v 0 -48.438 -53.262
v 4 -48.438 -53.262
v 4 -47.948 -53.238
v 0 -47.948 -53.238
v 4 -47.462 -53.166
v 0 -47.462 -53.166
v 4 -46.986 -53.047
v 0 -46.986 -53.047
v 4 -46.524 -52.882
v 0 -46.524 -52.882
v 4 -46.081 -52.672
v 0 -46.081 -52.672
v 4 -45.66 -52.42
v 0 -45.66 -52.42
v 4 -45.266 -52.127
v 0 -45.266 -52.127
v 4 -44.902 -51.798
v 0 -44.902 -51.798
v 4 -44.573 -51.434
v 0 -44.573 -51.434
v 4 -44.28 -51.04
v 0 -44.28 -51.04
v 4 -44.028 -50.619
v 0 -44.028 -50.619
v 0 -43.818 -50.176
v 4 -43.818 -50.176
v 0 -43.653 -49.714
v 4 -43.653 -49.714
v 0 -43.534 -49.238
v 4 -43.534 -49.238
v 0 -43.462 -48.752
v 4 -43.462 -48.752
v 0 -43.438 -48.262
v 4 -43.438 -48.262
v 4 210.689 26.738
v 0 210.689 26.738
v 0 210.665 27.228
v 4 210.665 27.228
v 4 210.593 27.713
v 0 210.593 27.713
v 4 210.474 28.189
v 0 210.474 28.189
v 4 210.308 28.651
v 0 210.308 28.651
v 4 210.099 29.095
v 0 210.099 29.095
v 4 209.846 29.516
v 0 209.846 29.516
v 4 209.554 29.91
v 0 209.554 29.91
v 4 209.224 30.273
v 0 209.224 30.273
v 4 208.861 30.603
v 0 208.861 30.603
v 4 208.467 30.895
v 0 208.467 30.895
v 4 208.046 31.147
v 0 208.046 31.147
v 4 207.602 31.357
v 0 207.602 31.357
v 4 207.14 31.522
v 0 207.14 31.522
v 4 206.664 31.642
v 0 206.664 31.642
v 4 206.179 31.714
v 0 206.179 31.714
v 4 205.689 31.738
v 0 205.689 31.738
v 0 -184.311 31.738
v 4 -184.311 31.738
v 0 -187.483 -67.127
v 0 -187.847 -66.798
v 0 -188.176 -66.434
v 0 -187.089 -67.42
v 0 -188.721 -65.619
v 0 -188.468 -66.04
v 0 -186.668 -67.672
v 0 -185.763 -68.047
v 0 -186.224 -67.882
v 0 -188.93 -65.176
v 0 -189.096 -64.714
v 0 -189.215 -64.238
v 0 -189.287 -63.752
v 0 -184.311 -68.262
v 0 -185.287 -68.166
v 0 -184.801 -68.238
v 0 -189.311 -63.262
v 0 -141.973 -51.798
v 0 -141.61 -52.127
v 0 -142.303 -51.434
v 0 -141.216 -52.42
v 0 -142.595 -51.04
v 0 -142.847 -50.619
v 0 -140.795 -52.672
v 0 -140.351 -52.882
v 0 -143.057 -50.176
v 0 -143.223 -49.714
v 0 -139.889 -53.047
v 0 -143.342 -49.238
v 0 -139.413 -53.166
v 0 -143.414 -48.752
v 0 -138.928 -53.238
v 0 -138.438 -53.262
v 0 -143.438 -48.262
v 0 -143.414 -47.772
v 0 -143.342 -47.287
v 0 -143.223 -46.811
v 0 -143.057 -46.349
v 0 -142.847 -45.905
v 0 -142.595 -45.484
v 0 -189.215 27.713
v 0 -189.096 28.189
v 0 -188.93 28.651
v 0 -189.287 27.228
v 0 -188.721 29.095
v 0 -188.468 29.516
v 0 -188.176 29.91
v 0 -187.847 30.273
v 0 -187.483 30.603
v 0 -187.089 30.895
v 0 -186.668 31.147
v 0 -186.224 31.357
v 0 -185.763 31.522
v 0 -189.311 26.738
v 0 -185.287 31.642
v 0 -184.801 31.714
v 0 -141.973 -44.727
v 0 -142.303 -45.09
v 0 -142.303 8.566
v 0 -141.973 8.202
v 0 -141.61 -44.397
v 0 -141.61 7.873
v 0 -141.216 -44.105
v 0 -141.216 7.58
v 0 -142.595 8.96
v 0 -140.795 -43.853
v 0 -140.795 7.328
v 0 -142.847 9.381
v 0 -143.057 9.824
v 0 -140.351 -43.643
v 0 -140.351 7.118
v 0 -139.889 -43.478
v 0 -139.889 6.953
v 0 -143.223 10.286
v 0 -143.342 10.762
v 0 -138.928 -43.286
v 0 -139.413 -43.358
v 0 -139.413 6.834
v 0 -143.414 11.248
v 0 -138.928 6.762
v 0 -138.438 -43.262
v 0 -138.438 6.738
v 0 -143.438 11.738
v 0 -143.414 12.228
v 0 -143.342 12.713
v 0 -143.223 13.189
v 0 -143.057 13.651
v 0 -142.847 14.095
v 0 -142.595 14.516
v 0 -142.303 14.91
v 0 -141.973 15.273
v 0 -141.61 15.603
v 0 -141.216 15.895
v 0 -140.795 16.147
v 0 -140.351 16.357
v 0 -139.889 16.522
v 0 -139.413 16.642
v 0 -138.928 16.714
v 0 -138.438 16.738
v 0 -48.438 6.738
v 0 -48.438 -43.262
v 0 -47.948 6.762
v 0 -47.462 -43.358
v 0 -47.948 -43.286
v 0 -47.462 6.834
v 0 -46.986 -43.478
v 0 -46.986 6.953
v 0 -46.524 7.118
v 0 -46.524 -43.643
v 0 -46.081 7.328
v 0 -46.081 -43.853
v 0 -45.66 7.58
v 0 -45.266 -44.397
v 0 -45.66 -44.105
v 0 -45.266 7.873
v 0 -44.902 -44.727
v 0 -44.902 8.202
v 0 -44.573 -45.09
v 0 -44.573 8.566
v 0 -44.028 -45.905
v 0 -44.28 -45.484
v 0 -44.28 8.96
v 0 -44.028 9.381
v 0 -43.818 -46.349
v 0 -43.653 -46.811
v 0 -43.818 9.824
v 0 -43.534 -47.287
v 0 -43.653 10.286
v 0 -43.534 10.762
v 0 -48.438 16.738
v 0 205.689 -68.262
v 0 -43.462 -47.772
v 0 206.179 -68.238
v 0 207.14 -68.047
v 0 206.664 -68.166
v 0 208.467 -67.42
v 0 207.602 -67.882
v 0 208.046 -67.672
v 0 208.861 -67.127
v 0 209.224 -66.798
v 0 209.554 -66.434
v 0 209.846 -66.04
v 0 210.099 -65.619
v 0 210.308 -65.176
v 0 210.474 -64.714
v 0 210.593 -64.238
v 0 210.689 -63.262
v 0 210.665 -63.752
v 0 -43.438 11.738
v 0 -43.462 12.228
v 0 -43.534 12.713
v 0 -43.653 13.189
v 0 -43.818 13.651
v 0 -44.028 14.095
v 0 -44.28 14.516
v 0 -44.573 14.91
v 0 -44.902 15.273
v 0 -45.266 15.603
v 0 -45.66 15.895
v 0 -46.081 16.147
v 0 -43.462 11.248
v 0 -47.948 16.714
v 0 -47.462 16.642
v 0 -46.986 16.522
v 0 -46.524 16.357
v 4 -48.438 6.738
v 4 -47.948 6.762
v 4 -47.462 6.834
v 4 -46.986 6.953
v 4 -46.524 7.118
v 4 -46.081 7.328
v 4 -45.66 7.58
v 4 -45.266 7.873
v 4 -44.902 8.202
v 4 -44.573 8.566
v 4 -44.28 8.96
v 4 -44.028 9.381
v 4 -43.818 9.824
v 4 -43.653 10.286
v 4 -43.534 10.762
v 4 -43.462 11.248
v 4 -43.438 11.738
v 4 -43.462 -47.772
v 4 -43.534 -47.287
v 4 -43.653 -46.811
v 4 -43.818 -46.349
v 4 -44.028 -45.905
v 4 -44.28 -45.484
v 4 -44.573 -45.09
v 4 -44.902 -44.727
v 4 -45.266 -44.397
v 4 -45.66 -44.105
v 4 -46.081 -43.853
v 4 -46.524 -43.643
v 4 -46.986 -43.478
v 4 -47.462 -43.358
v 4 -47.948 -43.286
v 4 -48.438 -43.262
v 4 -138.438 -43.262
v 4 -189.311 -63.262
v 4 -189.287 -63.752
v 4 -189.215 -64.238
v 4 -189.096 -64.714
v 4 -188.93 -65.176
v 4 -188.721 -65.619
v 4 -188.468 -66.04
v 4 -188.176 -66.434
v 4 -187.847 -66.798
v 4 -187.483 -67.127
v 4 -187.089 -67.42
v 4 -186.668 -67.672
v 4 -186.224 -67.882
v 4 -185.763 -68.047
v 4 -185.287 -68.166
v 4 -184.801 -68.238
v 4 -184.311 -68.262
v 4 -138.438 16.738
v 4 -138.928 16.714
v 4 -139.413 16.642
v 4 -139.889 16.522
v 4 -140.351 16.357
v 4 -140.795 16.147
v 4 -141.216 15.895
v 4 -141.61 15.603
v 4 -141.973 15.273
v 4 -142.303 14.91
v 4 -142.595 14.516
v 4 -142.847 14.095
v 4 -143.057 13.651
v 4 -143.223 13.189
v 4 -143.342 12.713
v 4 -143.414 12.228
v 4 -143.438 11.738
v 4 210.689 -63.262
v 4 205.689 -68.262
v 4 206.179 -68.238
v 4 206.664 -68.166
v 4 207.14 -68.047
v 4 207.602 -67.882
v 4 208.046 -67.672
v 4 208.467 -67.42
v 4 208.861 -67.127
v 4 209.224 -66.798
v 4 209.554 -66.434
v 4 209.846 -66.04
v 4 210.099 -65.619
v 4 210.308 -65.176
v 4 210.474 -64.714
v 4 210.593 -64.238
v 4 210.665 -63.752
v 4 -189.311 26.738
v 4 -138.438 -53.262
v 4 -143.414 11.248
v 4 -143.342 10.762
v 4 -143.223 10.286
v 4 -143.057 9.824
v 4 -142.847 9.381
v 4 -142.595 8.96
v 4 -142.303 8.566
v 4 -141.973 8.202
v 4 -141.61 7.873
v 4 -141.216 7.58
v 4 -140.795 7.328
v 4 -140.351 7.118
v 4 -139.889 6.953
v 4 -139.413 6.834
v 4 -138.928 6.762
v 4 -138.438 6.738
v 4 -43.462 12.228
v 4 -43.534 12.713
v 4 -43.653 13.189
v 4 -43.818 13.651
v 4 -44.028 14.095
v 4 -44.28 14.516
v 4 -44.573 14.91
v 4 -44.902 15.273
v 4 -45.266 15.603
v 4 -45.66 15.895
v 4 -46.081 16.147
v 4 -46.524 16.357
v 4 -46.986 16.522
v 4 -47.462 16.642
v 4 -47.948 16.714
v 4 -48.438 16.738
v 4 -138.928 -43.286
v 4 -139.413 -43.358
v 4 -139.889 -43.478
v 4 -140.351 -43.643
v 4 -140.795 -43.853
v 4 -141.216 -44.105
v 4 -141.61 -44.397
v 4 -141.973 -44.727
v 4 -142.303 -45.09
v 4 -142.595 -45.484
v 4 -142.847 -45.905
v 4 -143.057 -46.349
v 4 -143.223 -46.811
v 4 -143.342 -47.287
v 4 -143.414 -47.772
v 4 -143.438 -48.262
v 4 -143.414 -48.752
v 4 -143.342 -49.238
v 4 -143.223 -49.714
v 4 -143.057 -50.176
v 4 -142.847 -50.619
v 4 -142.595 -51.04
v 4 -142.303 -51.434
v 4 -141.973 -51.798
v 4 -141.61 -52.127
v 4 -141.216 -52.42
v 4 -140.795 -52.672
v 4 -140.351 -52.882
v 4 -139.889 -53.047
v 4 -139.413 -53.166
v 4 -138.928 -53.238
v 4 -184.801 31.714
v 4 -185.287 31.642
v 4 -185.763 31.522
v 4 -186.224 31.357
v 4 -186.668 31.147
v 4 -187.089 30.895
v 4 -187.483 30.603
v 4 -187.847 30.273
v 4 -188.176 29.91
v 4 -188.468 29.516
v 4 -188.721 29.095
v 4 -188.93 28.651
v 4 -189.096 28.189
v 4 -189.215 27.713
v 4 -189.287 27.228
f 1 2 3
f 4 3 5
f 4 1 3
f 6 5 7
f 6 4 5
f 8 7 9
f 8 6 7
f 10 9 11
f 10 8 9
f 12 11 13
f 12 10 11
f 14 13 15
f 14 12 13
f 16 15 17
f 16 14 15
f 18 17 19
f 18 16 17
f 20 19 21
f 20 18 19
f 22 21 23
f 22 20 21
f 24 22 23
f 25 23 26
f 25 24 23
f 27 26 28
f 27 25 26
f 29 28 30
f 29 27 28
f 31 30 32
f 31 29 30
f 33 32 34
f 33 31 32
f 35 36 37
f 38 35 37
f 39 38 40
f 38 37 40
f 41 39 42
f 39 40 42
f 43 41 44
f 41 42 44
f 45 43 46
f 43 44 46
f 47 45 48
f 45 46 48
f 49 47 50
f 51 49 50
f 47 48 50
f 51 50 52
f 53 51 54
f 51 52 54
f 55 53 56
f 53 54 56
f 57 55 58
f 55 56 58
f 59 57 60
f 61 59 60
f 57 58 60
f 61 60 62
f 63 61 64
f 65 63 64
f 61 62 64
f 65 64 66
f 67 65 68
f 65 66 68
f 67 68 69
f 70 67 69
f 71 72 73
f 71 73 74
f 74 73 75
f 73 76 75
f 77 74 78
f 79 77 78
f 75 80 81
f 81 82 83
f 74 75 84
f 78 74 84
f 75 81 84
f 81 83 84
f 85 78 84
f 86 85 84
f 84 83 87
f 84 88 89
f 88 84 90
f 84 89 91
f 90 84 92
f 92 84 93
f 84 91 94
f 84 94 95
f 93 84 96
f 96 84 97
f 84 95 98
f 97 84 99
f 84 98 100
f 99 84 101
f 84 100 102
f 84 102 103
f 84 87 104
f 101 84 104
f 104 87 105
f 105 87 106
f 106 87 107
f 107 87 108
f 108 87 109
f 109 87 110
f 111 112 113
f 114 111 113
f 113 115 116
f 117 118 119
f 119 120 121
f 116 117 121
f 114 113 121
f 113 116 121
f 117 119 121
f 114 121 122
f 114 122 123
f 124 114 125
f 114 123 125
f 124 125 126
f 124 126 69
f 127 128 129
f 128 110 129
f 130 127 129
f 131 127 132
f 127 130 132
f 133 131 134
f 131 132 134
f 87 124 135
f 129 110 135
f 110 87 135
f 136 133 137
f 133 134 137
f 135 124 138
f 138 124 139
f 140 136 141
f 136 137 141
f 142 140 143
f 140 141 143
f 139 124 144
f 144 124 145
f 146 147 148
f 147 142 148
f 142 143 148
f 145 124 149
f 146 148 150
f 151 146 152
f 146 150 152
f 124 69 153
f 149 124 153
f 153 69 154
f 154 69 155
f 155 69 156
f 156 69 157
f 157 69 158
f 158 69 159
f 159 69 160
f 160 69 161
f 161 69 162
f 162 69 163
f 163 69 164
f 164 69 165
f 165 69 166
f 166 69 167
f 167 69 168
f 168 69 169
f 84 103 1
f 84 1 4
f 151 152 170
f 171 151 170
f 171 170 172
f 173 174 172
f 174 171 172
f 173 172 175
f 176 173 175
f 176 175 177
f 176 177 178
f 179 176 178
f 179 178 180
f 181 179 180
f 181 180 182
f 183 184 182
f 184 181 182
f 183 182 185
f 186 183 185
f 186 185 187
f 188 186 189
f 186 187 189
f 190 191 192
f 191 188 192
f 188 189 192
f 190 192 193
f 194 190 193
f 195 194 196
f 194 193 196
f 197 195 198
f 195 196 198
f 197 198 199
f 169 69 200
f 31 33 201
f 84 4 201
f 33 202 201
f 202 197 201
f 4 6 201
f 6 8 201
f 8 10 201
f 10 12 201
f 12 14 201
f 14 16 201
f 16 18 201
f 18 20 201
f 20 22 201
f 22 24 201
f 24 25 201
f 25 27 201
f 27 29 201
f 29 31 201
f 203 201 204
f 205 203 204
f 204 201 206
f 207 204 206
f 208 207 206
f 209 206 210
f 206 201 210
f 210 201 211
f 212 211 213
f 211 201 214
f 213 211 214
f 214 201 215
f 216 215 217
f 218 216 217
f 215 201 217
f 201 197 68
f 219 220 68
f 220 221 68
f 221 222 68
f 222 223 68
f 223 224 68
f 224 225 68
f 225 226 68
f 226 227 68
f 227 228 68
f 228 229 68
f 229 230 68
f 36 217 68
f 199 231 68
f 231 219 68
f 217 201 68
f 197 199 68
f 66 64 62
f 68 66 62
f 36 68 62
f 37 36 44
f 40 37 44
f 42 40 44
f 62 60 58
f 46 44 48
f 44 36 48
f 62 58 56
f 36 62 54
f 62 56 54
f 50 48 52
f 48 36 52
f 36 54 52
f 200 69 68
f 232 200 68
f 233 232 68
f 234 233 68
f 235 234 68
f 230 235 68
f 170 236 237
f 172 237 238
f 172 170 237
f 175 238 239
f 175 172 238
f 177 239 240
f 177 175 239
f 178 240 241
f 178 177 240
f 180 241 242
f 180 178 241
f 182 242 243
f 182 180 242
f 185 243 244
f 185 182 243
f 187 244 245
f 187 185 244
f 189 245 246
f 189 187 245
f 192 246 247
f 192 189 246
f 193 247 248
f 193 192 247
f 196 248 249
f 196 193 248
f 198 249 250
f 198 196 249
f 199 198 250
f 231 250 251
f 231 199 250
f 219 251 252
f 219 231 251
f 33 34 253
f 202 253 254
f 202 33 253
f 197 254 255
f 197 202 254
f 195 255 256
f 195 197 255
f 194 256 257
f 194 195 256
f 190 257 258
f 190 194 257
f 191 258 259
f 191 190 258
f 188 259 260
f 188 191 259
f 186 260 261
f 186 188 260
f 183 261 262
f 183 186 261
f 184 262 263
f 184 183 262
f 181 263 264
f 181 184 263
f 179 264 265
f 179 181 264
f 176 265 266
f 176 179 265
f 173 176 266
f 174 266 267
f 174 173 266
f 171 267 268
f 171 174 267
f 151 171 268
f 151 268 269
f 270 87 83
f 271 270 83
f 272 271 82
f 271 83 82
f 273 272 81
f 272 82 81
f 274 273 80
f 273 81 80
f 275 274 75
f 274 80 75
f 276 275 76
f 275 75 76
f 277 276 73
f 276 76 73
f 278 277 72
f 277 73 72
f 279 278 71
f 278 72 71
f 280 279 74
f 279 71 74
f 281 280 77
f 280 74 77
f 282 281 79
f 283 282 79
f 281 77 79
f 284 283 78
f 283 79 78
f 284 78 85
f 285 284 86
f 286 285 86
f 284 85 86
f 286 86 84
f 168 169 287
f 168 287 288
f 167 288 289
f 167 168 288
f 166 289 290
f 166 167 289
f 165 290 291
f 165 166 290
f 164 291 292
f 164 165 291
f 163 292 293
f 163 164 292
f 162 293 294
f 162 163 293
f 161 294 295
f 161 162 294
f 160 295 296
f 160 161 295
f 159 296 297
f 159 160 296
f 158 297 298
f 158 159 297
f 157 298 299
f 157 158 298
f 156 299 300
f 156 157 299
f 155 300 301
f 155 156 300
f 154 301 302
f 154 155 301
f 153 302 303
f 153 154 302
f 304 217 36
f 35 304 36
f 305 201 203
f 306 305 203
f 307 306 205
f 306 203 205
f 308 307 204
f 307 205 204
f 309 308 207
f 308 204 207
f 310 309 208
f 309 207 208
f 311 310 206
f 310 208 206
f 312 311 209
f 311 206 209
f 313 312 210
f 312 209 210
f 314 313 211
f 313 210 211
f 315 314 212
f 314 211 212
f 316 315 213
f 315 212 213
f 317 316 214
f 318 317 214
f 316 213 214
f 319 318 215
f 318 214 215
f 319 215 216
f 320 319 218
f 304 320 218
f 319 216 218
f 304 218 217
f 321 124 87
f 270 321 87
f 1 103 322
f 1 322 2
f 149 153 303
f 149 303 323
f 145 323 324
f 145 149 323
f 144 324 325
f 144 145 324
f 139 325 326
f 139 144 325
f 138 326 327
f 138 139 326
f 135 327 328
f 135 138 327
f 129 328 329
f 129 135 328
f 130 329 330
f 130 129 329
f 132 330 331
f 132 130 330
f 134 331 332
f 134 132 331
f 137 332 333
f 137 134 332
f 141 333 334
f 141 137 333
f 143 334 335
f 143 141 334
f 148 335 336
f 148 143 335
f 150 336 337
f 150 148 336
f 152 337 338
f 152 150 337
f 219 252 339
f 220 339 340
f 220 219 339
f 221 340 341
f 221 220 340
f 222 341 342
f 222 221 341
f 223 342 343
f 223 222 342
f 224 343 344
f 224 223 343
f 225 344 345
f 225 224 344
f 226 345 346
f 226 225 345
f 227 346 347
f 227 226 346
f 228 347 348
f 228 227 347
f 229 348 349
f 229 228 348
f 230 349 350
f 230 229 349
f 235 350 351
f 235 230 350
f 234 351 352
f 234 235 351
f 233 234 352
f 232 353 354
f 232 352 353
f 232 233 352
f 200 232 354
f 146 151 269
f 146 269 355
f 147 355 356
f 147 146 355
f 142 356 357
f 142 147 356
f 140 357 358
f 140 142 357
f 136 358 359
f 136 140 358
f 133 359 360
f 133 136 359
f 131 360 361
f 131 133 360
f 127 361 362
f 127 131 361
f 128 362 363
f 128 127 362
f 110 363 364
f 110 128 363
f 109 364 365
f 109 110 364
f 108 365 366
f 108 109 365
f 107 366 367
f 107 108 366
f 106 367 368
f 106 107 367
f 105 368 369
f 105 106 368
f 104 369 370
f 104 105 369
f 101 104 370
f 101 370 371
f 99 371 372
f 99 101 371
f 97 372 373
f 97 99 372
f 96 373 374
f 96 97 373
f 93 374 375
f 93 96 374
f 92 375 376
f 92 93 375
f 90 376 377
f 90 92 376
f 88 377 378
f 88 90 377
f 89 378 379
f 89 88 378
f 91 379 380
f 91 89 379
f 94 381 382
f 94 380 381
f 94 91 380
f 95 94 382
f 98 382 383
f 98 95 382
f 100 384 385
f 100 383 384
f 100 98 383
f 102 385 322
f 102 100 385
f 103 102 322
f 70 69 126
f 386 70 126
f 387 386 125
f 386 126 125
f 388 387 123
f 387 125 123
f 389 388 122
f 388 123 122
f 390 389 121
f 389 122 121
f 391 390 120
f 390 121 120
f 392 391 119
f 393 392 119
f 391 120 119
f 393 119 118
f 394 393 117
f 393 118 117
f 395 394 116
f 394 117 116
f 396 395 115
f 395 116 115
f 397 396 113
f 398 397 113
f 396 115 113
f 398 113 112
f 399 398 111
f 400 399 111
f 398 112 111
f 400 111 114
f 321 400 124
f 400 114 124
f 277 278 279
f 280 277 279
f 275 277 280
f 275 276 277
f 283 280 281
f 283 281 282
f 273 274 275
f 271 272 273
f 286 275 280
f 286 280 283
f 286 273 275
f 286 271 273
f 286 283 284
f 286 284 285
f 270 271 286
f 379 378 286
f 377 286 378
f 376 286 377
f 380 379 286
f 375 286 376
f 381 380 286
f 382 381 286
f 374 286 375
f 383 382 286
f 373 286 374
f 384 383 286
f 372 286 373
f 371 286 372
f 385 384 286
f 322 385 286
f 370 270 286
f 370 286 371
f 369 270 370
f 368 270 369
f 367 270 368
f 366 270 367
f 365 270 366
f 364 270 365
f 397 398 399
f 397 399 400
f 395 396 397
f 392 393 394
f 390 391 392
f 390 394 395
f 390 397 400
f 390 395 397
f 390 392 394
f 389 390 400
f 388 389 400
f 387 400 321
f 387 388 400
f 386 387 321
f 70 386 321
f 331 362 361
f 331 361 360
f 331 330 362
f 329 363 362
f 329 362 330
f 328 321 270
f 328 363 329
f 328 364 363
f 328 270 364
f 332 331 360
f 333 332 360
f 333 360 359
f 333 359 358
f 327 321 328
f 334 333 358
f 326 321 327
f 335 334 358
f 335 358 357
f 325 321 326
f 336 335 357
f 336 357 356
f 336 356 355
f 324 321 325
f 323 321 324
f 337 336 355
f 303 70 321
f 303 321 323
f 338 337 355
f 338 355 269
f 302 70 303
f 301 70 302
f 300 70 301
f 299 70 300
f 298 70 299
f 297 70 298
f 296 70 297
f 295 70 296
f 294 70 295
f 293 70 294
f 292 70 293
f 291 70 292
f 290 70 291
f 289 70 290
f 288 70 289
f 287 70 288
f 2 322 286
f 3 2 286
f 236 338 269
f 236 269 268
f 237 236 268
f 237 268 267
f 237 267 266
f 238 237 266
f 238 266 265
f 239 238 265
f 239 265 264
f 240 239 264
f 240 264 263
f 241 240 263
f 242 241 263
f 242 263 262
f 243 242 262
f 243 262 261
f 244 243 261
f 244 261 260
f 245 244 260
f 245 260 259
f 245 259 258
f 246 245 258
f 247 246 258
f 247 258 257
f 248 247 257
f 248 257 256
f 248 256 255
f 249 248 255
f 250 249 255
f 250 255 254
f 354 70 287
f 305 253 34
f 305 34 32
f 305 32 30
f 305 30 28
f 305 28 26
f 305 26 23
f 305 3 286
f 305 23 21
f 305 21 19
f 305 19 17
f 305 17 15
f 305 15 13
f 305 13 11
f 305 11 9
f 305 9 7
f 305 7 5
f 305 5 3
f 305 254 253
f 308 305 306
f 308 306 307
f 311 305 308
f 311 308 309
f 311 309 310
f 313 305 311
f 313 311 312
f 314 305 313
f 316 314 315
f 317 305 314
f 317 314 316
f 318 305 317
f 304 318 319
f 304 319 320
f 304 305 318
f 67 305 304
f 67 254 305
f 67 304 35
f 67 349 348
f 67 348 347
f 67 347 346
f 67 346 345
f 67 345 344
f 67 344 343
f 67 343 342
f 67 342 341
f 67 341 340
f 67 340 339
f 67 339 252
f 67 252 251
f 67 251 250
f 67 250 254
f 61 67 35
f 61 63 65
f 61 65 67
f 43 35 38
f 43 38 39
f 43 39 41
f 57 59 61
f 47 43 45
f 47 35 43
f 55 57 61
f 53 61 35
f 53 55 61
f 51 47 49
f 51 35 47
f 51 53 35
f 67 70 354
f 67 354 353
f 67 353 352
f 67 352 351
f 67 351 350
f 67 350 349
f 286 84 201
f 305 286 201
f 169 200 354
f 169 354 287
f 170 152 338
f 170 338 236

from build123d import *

# Parameters (mm, degrees)
F1_DEPTH = 4
F3_DEPTH = 25


with BuildPart() as f1:
    # F0 (on Right) → F1 (new body)
    with BuildSketch(Plane.YZ):
        with BuildLine():
            Line((205.688918, 31.737779), (-184.311082, 31.737779))
            ThreePointArc((-184.311082, 31.737779), (-187.846616, 30.273313), (-189.311082, 26.737779))
            Line((-189.311082, 26.737779), (-189.311082, -63.262221))
            ThreePointArc((-189.311082, -63.262221), (-187.846616, -66.797755), (-184.311082, -68.262221))
            Line((-184.311082, -68.262221), (205.688918, -68.262221))
            ThreePointArc((205.688918, -68.262221), (209.224452, -66.797755), (210.688918, -63.262221))
            Line((210.688918, -63.262221), (210.688918, 26.737779))
            ThreePointArc((210.688918, 26.737779), (209.224452, 30.273313), (205.688918, 31.737779))
        make_face()
    extrude(amount=F1_DEPTH)

    # F2 (on Right) → F3 (cut)
    with BuildSketch(Plane.YZ):
        with BuildLine():
            Line((-48.437826, 16.737779), (-138.437826, 16.737779))
            ThreePointArc((-138.437826, 16.737779), (-141.973359, 15.273313), (-143.437826, 11.737779))
            ThreePointArc((-143.437826, 11.737779), (-141.973359, 8.202245), (-138.437826, 6.737779))
            Line((-138.437826, 6.737779), (-48.437826, 6.737779))
            ThreePointArc((-48.437826, 6.737779), (-44.902292, 8.202245), (-43.437826, 11.737779))
            ThreePointArc((-43.437826, 11.737779), (-44.902292, 15.273313), (-48.437826, 16.737779))
        make_face()
        with BuildLine():
            Line((-48.437826, -43.262221), (-138.437826, -43.262221))
            ThreePointArc((-138.437826, -43.262221), (-141.973359, -44.726687), (-143.437826, -48.262221))
            ThreePointArc((-143.437826, -48.262221), (-141.973359, -51.797755), (-138.437826, -53.262221))
            Line((-138.437826, -53.262221), (-48.437826, -53.262221))
            ThreePointArc((-48.437826, -53.262221), (-44.902292, -51.797755), (-43.437826, -48.262221))
            ThreePointArc((-43.437826, -48.262221), (-44.902292, -44.726687), (-48.437826, -43.262221))
        make_face()
    extrude(amount=F3_DEPTH, mode=Mode.SUBTRACT)


solid = f1.part
